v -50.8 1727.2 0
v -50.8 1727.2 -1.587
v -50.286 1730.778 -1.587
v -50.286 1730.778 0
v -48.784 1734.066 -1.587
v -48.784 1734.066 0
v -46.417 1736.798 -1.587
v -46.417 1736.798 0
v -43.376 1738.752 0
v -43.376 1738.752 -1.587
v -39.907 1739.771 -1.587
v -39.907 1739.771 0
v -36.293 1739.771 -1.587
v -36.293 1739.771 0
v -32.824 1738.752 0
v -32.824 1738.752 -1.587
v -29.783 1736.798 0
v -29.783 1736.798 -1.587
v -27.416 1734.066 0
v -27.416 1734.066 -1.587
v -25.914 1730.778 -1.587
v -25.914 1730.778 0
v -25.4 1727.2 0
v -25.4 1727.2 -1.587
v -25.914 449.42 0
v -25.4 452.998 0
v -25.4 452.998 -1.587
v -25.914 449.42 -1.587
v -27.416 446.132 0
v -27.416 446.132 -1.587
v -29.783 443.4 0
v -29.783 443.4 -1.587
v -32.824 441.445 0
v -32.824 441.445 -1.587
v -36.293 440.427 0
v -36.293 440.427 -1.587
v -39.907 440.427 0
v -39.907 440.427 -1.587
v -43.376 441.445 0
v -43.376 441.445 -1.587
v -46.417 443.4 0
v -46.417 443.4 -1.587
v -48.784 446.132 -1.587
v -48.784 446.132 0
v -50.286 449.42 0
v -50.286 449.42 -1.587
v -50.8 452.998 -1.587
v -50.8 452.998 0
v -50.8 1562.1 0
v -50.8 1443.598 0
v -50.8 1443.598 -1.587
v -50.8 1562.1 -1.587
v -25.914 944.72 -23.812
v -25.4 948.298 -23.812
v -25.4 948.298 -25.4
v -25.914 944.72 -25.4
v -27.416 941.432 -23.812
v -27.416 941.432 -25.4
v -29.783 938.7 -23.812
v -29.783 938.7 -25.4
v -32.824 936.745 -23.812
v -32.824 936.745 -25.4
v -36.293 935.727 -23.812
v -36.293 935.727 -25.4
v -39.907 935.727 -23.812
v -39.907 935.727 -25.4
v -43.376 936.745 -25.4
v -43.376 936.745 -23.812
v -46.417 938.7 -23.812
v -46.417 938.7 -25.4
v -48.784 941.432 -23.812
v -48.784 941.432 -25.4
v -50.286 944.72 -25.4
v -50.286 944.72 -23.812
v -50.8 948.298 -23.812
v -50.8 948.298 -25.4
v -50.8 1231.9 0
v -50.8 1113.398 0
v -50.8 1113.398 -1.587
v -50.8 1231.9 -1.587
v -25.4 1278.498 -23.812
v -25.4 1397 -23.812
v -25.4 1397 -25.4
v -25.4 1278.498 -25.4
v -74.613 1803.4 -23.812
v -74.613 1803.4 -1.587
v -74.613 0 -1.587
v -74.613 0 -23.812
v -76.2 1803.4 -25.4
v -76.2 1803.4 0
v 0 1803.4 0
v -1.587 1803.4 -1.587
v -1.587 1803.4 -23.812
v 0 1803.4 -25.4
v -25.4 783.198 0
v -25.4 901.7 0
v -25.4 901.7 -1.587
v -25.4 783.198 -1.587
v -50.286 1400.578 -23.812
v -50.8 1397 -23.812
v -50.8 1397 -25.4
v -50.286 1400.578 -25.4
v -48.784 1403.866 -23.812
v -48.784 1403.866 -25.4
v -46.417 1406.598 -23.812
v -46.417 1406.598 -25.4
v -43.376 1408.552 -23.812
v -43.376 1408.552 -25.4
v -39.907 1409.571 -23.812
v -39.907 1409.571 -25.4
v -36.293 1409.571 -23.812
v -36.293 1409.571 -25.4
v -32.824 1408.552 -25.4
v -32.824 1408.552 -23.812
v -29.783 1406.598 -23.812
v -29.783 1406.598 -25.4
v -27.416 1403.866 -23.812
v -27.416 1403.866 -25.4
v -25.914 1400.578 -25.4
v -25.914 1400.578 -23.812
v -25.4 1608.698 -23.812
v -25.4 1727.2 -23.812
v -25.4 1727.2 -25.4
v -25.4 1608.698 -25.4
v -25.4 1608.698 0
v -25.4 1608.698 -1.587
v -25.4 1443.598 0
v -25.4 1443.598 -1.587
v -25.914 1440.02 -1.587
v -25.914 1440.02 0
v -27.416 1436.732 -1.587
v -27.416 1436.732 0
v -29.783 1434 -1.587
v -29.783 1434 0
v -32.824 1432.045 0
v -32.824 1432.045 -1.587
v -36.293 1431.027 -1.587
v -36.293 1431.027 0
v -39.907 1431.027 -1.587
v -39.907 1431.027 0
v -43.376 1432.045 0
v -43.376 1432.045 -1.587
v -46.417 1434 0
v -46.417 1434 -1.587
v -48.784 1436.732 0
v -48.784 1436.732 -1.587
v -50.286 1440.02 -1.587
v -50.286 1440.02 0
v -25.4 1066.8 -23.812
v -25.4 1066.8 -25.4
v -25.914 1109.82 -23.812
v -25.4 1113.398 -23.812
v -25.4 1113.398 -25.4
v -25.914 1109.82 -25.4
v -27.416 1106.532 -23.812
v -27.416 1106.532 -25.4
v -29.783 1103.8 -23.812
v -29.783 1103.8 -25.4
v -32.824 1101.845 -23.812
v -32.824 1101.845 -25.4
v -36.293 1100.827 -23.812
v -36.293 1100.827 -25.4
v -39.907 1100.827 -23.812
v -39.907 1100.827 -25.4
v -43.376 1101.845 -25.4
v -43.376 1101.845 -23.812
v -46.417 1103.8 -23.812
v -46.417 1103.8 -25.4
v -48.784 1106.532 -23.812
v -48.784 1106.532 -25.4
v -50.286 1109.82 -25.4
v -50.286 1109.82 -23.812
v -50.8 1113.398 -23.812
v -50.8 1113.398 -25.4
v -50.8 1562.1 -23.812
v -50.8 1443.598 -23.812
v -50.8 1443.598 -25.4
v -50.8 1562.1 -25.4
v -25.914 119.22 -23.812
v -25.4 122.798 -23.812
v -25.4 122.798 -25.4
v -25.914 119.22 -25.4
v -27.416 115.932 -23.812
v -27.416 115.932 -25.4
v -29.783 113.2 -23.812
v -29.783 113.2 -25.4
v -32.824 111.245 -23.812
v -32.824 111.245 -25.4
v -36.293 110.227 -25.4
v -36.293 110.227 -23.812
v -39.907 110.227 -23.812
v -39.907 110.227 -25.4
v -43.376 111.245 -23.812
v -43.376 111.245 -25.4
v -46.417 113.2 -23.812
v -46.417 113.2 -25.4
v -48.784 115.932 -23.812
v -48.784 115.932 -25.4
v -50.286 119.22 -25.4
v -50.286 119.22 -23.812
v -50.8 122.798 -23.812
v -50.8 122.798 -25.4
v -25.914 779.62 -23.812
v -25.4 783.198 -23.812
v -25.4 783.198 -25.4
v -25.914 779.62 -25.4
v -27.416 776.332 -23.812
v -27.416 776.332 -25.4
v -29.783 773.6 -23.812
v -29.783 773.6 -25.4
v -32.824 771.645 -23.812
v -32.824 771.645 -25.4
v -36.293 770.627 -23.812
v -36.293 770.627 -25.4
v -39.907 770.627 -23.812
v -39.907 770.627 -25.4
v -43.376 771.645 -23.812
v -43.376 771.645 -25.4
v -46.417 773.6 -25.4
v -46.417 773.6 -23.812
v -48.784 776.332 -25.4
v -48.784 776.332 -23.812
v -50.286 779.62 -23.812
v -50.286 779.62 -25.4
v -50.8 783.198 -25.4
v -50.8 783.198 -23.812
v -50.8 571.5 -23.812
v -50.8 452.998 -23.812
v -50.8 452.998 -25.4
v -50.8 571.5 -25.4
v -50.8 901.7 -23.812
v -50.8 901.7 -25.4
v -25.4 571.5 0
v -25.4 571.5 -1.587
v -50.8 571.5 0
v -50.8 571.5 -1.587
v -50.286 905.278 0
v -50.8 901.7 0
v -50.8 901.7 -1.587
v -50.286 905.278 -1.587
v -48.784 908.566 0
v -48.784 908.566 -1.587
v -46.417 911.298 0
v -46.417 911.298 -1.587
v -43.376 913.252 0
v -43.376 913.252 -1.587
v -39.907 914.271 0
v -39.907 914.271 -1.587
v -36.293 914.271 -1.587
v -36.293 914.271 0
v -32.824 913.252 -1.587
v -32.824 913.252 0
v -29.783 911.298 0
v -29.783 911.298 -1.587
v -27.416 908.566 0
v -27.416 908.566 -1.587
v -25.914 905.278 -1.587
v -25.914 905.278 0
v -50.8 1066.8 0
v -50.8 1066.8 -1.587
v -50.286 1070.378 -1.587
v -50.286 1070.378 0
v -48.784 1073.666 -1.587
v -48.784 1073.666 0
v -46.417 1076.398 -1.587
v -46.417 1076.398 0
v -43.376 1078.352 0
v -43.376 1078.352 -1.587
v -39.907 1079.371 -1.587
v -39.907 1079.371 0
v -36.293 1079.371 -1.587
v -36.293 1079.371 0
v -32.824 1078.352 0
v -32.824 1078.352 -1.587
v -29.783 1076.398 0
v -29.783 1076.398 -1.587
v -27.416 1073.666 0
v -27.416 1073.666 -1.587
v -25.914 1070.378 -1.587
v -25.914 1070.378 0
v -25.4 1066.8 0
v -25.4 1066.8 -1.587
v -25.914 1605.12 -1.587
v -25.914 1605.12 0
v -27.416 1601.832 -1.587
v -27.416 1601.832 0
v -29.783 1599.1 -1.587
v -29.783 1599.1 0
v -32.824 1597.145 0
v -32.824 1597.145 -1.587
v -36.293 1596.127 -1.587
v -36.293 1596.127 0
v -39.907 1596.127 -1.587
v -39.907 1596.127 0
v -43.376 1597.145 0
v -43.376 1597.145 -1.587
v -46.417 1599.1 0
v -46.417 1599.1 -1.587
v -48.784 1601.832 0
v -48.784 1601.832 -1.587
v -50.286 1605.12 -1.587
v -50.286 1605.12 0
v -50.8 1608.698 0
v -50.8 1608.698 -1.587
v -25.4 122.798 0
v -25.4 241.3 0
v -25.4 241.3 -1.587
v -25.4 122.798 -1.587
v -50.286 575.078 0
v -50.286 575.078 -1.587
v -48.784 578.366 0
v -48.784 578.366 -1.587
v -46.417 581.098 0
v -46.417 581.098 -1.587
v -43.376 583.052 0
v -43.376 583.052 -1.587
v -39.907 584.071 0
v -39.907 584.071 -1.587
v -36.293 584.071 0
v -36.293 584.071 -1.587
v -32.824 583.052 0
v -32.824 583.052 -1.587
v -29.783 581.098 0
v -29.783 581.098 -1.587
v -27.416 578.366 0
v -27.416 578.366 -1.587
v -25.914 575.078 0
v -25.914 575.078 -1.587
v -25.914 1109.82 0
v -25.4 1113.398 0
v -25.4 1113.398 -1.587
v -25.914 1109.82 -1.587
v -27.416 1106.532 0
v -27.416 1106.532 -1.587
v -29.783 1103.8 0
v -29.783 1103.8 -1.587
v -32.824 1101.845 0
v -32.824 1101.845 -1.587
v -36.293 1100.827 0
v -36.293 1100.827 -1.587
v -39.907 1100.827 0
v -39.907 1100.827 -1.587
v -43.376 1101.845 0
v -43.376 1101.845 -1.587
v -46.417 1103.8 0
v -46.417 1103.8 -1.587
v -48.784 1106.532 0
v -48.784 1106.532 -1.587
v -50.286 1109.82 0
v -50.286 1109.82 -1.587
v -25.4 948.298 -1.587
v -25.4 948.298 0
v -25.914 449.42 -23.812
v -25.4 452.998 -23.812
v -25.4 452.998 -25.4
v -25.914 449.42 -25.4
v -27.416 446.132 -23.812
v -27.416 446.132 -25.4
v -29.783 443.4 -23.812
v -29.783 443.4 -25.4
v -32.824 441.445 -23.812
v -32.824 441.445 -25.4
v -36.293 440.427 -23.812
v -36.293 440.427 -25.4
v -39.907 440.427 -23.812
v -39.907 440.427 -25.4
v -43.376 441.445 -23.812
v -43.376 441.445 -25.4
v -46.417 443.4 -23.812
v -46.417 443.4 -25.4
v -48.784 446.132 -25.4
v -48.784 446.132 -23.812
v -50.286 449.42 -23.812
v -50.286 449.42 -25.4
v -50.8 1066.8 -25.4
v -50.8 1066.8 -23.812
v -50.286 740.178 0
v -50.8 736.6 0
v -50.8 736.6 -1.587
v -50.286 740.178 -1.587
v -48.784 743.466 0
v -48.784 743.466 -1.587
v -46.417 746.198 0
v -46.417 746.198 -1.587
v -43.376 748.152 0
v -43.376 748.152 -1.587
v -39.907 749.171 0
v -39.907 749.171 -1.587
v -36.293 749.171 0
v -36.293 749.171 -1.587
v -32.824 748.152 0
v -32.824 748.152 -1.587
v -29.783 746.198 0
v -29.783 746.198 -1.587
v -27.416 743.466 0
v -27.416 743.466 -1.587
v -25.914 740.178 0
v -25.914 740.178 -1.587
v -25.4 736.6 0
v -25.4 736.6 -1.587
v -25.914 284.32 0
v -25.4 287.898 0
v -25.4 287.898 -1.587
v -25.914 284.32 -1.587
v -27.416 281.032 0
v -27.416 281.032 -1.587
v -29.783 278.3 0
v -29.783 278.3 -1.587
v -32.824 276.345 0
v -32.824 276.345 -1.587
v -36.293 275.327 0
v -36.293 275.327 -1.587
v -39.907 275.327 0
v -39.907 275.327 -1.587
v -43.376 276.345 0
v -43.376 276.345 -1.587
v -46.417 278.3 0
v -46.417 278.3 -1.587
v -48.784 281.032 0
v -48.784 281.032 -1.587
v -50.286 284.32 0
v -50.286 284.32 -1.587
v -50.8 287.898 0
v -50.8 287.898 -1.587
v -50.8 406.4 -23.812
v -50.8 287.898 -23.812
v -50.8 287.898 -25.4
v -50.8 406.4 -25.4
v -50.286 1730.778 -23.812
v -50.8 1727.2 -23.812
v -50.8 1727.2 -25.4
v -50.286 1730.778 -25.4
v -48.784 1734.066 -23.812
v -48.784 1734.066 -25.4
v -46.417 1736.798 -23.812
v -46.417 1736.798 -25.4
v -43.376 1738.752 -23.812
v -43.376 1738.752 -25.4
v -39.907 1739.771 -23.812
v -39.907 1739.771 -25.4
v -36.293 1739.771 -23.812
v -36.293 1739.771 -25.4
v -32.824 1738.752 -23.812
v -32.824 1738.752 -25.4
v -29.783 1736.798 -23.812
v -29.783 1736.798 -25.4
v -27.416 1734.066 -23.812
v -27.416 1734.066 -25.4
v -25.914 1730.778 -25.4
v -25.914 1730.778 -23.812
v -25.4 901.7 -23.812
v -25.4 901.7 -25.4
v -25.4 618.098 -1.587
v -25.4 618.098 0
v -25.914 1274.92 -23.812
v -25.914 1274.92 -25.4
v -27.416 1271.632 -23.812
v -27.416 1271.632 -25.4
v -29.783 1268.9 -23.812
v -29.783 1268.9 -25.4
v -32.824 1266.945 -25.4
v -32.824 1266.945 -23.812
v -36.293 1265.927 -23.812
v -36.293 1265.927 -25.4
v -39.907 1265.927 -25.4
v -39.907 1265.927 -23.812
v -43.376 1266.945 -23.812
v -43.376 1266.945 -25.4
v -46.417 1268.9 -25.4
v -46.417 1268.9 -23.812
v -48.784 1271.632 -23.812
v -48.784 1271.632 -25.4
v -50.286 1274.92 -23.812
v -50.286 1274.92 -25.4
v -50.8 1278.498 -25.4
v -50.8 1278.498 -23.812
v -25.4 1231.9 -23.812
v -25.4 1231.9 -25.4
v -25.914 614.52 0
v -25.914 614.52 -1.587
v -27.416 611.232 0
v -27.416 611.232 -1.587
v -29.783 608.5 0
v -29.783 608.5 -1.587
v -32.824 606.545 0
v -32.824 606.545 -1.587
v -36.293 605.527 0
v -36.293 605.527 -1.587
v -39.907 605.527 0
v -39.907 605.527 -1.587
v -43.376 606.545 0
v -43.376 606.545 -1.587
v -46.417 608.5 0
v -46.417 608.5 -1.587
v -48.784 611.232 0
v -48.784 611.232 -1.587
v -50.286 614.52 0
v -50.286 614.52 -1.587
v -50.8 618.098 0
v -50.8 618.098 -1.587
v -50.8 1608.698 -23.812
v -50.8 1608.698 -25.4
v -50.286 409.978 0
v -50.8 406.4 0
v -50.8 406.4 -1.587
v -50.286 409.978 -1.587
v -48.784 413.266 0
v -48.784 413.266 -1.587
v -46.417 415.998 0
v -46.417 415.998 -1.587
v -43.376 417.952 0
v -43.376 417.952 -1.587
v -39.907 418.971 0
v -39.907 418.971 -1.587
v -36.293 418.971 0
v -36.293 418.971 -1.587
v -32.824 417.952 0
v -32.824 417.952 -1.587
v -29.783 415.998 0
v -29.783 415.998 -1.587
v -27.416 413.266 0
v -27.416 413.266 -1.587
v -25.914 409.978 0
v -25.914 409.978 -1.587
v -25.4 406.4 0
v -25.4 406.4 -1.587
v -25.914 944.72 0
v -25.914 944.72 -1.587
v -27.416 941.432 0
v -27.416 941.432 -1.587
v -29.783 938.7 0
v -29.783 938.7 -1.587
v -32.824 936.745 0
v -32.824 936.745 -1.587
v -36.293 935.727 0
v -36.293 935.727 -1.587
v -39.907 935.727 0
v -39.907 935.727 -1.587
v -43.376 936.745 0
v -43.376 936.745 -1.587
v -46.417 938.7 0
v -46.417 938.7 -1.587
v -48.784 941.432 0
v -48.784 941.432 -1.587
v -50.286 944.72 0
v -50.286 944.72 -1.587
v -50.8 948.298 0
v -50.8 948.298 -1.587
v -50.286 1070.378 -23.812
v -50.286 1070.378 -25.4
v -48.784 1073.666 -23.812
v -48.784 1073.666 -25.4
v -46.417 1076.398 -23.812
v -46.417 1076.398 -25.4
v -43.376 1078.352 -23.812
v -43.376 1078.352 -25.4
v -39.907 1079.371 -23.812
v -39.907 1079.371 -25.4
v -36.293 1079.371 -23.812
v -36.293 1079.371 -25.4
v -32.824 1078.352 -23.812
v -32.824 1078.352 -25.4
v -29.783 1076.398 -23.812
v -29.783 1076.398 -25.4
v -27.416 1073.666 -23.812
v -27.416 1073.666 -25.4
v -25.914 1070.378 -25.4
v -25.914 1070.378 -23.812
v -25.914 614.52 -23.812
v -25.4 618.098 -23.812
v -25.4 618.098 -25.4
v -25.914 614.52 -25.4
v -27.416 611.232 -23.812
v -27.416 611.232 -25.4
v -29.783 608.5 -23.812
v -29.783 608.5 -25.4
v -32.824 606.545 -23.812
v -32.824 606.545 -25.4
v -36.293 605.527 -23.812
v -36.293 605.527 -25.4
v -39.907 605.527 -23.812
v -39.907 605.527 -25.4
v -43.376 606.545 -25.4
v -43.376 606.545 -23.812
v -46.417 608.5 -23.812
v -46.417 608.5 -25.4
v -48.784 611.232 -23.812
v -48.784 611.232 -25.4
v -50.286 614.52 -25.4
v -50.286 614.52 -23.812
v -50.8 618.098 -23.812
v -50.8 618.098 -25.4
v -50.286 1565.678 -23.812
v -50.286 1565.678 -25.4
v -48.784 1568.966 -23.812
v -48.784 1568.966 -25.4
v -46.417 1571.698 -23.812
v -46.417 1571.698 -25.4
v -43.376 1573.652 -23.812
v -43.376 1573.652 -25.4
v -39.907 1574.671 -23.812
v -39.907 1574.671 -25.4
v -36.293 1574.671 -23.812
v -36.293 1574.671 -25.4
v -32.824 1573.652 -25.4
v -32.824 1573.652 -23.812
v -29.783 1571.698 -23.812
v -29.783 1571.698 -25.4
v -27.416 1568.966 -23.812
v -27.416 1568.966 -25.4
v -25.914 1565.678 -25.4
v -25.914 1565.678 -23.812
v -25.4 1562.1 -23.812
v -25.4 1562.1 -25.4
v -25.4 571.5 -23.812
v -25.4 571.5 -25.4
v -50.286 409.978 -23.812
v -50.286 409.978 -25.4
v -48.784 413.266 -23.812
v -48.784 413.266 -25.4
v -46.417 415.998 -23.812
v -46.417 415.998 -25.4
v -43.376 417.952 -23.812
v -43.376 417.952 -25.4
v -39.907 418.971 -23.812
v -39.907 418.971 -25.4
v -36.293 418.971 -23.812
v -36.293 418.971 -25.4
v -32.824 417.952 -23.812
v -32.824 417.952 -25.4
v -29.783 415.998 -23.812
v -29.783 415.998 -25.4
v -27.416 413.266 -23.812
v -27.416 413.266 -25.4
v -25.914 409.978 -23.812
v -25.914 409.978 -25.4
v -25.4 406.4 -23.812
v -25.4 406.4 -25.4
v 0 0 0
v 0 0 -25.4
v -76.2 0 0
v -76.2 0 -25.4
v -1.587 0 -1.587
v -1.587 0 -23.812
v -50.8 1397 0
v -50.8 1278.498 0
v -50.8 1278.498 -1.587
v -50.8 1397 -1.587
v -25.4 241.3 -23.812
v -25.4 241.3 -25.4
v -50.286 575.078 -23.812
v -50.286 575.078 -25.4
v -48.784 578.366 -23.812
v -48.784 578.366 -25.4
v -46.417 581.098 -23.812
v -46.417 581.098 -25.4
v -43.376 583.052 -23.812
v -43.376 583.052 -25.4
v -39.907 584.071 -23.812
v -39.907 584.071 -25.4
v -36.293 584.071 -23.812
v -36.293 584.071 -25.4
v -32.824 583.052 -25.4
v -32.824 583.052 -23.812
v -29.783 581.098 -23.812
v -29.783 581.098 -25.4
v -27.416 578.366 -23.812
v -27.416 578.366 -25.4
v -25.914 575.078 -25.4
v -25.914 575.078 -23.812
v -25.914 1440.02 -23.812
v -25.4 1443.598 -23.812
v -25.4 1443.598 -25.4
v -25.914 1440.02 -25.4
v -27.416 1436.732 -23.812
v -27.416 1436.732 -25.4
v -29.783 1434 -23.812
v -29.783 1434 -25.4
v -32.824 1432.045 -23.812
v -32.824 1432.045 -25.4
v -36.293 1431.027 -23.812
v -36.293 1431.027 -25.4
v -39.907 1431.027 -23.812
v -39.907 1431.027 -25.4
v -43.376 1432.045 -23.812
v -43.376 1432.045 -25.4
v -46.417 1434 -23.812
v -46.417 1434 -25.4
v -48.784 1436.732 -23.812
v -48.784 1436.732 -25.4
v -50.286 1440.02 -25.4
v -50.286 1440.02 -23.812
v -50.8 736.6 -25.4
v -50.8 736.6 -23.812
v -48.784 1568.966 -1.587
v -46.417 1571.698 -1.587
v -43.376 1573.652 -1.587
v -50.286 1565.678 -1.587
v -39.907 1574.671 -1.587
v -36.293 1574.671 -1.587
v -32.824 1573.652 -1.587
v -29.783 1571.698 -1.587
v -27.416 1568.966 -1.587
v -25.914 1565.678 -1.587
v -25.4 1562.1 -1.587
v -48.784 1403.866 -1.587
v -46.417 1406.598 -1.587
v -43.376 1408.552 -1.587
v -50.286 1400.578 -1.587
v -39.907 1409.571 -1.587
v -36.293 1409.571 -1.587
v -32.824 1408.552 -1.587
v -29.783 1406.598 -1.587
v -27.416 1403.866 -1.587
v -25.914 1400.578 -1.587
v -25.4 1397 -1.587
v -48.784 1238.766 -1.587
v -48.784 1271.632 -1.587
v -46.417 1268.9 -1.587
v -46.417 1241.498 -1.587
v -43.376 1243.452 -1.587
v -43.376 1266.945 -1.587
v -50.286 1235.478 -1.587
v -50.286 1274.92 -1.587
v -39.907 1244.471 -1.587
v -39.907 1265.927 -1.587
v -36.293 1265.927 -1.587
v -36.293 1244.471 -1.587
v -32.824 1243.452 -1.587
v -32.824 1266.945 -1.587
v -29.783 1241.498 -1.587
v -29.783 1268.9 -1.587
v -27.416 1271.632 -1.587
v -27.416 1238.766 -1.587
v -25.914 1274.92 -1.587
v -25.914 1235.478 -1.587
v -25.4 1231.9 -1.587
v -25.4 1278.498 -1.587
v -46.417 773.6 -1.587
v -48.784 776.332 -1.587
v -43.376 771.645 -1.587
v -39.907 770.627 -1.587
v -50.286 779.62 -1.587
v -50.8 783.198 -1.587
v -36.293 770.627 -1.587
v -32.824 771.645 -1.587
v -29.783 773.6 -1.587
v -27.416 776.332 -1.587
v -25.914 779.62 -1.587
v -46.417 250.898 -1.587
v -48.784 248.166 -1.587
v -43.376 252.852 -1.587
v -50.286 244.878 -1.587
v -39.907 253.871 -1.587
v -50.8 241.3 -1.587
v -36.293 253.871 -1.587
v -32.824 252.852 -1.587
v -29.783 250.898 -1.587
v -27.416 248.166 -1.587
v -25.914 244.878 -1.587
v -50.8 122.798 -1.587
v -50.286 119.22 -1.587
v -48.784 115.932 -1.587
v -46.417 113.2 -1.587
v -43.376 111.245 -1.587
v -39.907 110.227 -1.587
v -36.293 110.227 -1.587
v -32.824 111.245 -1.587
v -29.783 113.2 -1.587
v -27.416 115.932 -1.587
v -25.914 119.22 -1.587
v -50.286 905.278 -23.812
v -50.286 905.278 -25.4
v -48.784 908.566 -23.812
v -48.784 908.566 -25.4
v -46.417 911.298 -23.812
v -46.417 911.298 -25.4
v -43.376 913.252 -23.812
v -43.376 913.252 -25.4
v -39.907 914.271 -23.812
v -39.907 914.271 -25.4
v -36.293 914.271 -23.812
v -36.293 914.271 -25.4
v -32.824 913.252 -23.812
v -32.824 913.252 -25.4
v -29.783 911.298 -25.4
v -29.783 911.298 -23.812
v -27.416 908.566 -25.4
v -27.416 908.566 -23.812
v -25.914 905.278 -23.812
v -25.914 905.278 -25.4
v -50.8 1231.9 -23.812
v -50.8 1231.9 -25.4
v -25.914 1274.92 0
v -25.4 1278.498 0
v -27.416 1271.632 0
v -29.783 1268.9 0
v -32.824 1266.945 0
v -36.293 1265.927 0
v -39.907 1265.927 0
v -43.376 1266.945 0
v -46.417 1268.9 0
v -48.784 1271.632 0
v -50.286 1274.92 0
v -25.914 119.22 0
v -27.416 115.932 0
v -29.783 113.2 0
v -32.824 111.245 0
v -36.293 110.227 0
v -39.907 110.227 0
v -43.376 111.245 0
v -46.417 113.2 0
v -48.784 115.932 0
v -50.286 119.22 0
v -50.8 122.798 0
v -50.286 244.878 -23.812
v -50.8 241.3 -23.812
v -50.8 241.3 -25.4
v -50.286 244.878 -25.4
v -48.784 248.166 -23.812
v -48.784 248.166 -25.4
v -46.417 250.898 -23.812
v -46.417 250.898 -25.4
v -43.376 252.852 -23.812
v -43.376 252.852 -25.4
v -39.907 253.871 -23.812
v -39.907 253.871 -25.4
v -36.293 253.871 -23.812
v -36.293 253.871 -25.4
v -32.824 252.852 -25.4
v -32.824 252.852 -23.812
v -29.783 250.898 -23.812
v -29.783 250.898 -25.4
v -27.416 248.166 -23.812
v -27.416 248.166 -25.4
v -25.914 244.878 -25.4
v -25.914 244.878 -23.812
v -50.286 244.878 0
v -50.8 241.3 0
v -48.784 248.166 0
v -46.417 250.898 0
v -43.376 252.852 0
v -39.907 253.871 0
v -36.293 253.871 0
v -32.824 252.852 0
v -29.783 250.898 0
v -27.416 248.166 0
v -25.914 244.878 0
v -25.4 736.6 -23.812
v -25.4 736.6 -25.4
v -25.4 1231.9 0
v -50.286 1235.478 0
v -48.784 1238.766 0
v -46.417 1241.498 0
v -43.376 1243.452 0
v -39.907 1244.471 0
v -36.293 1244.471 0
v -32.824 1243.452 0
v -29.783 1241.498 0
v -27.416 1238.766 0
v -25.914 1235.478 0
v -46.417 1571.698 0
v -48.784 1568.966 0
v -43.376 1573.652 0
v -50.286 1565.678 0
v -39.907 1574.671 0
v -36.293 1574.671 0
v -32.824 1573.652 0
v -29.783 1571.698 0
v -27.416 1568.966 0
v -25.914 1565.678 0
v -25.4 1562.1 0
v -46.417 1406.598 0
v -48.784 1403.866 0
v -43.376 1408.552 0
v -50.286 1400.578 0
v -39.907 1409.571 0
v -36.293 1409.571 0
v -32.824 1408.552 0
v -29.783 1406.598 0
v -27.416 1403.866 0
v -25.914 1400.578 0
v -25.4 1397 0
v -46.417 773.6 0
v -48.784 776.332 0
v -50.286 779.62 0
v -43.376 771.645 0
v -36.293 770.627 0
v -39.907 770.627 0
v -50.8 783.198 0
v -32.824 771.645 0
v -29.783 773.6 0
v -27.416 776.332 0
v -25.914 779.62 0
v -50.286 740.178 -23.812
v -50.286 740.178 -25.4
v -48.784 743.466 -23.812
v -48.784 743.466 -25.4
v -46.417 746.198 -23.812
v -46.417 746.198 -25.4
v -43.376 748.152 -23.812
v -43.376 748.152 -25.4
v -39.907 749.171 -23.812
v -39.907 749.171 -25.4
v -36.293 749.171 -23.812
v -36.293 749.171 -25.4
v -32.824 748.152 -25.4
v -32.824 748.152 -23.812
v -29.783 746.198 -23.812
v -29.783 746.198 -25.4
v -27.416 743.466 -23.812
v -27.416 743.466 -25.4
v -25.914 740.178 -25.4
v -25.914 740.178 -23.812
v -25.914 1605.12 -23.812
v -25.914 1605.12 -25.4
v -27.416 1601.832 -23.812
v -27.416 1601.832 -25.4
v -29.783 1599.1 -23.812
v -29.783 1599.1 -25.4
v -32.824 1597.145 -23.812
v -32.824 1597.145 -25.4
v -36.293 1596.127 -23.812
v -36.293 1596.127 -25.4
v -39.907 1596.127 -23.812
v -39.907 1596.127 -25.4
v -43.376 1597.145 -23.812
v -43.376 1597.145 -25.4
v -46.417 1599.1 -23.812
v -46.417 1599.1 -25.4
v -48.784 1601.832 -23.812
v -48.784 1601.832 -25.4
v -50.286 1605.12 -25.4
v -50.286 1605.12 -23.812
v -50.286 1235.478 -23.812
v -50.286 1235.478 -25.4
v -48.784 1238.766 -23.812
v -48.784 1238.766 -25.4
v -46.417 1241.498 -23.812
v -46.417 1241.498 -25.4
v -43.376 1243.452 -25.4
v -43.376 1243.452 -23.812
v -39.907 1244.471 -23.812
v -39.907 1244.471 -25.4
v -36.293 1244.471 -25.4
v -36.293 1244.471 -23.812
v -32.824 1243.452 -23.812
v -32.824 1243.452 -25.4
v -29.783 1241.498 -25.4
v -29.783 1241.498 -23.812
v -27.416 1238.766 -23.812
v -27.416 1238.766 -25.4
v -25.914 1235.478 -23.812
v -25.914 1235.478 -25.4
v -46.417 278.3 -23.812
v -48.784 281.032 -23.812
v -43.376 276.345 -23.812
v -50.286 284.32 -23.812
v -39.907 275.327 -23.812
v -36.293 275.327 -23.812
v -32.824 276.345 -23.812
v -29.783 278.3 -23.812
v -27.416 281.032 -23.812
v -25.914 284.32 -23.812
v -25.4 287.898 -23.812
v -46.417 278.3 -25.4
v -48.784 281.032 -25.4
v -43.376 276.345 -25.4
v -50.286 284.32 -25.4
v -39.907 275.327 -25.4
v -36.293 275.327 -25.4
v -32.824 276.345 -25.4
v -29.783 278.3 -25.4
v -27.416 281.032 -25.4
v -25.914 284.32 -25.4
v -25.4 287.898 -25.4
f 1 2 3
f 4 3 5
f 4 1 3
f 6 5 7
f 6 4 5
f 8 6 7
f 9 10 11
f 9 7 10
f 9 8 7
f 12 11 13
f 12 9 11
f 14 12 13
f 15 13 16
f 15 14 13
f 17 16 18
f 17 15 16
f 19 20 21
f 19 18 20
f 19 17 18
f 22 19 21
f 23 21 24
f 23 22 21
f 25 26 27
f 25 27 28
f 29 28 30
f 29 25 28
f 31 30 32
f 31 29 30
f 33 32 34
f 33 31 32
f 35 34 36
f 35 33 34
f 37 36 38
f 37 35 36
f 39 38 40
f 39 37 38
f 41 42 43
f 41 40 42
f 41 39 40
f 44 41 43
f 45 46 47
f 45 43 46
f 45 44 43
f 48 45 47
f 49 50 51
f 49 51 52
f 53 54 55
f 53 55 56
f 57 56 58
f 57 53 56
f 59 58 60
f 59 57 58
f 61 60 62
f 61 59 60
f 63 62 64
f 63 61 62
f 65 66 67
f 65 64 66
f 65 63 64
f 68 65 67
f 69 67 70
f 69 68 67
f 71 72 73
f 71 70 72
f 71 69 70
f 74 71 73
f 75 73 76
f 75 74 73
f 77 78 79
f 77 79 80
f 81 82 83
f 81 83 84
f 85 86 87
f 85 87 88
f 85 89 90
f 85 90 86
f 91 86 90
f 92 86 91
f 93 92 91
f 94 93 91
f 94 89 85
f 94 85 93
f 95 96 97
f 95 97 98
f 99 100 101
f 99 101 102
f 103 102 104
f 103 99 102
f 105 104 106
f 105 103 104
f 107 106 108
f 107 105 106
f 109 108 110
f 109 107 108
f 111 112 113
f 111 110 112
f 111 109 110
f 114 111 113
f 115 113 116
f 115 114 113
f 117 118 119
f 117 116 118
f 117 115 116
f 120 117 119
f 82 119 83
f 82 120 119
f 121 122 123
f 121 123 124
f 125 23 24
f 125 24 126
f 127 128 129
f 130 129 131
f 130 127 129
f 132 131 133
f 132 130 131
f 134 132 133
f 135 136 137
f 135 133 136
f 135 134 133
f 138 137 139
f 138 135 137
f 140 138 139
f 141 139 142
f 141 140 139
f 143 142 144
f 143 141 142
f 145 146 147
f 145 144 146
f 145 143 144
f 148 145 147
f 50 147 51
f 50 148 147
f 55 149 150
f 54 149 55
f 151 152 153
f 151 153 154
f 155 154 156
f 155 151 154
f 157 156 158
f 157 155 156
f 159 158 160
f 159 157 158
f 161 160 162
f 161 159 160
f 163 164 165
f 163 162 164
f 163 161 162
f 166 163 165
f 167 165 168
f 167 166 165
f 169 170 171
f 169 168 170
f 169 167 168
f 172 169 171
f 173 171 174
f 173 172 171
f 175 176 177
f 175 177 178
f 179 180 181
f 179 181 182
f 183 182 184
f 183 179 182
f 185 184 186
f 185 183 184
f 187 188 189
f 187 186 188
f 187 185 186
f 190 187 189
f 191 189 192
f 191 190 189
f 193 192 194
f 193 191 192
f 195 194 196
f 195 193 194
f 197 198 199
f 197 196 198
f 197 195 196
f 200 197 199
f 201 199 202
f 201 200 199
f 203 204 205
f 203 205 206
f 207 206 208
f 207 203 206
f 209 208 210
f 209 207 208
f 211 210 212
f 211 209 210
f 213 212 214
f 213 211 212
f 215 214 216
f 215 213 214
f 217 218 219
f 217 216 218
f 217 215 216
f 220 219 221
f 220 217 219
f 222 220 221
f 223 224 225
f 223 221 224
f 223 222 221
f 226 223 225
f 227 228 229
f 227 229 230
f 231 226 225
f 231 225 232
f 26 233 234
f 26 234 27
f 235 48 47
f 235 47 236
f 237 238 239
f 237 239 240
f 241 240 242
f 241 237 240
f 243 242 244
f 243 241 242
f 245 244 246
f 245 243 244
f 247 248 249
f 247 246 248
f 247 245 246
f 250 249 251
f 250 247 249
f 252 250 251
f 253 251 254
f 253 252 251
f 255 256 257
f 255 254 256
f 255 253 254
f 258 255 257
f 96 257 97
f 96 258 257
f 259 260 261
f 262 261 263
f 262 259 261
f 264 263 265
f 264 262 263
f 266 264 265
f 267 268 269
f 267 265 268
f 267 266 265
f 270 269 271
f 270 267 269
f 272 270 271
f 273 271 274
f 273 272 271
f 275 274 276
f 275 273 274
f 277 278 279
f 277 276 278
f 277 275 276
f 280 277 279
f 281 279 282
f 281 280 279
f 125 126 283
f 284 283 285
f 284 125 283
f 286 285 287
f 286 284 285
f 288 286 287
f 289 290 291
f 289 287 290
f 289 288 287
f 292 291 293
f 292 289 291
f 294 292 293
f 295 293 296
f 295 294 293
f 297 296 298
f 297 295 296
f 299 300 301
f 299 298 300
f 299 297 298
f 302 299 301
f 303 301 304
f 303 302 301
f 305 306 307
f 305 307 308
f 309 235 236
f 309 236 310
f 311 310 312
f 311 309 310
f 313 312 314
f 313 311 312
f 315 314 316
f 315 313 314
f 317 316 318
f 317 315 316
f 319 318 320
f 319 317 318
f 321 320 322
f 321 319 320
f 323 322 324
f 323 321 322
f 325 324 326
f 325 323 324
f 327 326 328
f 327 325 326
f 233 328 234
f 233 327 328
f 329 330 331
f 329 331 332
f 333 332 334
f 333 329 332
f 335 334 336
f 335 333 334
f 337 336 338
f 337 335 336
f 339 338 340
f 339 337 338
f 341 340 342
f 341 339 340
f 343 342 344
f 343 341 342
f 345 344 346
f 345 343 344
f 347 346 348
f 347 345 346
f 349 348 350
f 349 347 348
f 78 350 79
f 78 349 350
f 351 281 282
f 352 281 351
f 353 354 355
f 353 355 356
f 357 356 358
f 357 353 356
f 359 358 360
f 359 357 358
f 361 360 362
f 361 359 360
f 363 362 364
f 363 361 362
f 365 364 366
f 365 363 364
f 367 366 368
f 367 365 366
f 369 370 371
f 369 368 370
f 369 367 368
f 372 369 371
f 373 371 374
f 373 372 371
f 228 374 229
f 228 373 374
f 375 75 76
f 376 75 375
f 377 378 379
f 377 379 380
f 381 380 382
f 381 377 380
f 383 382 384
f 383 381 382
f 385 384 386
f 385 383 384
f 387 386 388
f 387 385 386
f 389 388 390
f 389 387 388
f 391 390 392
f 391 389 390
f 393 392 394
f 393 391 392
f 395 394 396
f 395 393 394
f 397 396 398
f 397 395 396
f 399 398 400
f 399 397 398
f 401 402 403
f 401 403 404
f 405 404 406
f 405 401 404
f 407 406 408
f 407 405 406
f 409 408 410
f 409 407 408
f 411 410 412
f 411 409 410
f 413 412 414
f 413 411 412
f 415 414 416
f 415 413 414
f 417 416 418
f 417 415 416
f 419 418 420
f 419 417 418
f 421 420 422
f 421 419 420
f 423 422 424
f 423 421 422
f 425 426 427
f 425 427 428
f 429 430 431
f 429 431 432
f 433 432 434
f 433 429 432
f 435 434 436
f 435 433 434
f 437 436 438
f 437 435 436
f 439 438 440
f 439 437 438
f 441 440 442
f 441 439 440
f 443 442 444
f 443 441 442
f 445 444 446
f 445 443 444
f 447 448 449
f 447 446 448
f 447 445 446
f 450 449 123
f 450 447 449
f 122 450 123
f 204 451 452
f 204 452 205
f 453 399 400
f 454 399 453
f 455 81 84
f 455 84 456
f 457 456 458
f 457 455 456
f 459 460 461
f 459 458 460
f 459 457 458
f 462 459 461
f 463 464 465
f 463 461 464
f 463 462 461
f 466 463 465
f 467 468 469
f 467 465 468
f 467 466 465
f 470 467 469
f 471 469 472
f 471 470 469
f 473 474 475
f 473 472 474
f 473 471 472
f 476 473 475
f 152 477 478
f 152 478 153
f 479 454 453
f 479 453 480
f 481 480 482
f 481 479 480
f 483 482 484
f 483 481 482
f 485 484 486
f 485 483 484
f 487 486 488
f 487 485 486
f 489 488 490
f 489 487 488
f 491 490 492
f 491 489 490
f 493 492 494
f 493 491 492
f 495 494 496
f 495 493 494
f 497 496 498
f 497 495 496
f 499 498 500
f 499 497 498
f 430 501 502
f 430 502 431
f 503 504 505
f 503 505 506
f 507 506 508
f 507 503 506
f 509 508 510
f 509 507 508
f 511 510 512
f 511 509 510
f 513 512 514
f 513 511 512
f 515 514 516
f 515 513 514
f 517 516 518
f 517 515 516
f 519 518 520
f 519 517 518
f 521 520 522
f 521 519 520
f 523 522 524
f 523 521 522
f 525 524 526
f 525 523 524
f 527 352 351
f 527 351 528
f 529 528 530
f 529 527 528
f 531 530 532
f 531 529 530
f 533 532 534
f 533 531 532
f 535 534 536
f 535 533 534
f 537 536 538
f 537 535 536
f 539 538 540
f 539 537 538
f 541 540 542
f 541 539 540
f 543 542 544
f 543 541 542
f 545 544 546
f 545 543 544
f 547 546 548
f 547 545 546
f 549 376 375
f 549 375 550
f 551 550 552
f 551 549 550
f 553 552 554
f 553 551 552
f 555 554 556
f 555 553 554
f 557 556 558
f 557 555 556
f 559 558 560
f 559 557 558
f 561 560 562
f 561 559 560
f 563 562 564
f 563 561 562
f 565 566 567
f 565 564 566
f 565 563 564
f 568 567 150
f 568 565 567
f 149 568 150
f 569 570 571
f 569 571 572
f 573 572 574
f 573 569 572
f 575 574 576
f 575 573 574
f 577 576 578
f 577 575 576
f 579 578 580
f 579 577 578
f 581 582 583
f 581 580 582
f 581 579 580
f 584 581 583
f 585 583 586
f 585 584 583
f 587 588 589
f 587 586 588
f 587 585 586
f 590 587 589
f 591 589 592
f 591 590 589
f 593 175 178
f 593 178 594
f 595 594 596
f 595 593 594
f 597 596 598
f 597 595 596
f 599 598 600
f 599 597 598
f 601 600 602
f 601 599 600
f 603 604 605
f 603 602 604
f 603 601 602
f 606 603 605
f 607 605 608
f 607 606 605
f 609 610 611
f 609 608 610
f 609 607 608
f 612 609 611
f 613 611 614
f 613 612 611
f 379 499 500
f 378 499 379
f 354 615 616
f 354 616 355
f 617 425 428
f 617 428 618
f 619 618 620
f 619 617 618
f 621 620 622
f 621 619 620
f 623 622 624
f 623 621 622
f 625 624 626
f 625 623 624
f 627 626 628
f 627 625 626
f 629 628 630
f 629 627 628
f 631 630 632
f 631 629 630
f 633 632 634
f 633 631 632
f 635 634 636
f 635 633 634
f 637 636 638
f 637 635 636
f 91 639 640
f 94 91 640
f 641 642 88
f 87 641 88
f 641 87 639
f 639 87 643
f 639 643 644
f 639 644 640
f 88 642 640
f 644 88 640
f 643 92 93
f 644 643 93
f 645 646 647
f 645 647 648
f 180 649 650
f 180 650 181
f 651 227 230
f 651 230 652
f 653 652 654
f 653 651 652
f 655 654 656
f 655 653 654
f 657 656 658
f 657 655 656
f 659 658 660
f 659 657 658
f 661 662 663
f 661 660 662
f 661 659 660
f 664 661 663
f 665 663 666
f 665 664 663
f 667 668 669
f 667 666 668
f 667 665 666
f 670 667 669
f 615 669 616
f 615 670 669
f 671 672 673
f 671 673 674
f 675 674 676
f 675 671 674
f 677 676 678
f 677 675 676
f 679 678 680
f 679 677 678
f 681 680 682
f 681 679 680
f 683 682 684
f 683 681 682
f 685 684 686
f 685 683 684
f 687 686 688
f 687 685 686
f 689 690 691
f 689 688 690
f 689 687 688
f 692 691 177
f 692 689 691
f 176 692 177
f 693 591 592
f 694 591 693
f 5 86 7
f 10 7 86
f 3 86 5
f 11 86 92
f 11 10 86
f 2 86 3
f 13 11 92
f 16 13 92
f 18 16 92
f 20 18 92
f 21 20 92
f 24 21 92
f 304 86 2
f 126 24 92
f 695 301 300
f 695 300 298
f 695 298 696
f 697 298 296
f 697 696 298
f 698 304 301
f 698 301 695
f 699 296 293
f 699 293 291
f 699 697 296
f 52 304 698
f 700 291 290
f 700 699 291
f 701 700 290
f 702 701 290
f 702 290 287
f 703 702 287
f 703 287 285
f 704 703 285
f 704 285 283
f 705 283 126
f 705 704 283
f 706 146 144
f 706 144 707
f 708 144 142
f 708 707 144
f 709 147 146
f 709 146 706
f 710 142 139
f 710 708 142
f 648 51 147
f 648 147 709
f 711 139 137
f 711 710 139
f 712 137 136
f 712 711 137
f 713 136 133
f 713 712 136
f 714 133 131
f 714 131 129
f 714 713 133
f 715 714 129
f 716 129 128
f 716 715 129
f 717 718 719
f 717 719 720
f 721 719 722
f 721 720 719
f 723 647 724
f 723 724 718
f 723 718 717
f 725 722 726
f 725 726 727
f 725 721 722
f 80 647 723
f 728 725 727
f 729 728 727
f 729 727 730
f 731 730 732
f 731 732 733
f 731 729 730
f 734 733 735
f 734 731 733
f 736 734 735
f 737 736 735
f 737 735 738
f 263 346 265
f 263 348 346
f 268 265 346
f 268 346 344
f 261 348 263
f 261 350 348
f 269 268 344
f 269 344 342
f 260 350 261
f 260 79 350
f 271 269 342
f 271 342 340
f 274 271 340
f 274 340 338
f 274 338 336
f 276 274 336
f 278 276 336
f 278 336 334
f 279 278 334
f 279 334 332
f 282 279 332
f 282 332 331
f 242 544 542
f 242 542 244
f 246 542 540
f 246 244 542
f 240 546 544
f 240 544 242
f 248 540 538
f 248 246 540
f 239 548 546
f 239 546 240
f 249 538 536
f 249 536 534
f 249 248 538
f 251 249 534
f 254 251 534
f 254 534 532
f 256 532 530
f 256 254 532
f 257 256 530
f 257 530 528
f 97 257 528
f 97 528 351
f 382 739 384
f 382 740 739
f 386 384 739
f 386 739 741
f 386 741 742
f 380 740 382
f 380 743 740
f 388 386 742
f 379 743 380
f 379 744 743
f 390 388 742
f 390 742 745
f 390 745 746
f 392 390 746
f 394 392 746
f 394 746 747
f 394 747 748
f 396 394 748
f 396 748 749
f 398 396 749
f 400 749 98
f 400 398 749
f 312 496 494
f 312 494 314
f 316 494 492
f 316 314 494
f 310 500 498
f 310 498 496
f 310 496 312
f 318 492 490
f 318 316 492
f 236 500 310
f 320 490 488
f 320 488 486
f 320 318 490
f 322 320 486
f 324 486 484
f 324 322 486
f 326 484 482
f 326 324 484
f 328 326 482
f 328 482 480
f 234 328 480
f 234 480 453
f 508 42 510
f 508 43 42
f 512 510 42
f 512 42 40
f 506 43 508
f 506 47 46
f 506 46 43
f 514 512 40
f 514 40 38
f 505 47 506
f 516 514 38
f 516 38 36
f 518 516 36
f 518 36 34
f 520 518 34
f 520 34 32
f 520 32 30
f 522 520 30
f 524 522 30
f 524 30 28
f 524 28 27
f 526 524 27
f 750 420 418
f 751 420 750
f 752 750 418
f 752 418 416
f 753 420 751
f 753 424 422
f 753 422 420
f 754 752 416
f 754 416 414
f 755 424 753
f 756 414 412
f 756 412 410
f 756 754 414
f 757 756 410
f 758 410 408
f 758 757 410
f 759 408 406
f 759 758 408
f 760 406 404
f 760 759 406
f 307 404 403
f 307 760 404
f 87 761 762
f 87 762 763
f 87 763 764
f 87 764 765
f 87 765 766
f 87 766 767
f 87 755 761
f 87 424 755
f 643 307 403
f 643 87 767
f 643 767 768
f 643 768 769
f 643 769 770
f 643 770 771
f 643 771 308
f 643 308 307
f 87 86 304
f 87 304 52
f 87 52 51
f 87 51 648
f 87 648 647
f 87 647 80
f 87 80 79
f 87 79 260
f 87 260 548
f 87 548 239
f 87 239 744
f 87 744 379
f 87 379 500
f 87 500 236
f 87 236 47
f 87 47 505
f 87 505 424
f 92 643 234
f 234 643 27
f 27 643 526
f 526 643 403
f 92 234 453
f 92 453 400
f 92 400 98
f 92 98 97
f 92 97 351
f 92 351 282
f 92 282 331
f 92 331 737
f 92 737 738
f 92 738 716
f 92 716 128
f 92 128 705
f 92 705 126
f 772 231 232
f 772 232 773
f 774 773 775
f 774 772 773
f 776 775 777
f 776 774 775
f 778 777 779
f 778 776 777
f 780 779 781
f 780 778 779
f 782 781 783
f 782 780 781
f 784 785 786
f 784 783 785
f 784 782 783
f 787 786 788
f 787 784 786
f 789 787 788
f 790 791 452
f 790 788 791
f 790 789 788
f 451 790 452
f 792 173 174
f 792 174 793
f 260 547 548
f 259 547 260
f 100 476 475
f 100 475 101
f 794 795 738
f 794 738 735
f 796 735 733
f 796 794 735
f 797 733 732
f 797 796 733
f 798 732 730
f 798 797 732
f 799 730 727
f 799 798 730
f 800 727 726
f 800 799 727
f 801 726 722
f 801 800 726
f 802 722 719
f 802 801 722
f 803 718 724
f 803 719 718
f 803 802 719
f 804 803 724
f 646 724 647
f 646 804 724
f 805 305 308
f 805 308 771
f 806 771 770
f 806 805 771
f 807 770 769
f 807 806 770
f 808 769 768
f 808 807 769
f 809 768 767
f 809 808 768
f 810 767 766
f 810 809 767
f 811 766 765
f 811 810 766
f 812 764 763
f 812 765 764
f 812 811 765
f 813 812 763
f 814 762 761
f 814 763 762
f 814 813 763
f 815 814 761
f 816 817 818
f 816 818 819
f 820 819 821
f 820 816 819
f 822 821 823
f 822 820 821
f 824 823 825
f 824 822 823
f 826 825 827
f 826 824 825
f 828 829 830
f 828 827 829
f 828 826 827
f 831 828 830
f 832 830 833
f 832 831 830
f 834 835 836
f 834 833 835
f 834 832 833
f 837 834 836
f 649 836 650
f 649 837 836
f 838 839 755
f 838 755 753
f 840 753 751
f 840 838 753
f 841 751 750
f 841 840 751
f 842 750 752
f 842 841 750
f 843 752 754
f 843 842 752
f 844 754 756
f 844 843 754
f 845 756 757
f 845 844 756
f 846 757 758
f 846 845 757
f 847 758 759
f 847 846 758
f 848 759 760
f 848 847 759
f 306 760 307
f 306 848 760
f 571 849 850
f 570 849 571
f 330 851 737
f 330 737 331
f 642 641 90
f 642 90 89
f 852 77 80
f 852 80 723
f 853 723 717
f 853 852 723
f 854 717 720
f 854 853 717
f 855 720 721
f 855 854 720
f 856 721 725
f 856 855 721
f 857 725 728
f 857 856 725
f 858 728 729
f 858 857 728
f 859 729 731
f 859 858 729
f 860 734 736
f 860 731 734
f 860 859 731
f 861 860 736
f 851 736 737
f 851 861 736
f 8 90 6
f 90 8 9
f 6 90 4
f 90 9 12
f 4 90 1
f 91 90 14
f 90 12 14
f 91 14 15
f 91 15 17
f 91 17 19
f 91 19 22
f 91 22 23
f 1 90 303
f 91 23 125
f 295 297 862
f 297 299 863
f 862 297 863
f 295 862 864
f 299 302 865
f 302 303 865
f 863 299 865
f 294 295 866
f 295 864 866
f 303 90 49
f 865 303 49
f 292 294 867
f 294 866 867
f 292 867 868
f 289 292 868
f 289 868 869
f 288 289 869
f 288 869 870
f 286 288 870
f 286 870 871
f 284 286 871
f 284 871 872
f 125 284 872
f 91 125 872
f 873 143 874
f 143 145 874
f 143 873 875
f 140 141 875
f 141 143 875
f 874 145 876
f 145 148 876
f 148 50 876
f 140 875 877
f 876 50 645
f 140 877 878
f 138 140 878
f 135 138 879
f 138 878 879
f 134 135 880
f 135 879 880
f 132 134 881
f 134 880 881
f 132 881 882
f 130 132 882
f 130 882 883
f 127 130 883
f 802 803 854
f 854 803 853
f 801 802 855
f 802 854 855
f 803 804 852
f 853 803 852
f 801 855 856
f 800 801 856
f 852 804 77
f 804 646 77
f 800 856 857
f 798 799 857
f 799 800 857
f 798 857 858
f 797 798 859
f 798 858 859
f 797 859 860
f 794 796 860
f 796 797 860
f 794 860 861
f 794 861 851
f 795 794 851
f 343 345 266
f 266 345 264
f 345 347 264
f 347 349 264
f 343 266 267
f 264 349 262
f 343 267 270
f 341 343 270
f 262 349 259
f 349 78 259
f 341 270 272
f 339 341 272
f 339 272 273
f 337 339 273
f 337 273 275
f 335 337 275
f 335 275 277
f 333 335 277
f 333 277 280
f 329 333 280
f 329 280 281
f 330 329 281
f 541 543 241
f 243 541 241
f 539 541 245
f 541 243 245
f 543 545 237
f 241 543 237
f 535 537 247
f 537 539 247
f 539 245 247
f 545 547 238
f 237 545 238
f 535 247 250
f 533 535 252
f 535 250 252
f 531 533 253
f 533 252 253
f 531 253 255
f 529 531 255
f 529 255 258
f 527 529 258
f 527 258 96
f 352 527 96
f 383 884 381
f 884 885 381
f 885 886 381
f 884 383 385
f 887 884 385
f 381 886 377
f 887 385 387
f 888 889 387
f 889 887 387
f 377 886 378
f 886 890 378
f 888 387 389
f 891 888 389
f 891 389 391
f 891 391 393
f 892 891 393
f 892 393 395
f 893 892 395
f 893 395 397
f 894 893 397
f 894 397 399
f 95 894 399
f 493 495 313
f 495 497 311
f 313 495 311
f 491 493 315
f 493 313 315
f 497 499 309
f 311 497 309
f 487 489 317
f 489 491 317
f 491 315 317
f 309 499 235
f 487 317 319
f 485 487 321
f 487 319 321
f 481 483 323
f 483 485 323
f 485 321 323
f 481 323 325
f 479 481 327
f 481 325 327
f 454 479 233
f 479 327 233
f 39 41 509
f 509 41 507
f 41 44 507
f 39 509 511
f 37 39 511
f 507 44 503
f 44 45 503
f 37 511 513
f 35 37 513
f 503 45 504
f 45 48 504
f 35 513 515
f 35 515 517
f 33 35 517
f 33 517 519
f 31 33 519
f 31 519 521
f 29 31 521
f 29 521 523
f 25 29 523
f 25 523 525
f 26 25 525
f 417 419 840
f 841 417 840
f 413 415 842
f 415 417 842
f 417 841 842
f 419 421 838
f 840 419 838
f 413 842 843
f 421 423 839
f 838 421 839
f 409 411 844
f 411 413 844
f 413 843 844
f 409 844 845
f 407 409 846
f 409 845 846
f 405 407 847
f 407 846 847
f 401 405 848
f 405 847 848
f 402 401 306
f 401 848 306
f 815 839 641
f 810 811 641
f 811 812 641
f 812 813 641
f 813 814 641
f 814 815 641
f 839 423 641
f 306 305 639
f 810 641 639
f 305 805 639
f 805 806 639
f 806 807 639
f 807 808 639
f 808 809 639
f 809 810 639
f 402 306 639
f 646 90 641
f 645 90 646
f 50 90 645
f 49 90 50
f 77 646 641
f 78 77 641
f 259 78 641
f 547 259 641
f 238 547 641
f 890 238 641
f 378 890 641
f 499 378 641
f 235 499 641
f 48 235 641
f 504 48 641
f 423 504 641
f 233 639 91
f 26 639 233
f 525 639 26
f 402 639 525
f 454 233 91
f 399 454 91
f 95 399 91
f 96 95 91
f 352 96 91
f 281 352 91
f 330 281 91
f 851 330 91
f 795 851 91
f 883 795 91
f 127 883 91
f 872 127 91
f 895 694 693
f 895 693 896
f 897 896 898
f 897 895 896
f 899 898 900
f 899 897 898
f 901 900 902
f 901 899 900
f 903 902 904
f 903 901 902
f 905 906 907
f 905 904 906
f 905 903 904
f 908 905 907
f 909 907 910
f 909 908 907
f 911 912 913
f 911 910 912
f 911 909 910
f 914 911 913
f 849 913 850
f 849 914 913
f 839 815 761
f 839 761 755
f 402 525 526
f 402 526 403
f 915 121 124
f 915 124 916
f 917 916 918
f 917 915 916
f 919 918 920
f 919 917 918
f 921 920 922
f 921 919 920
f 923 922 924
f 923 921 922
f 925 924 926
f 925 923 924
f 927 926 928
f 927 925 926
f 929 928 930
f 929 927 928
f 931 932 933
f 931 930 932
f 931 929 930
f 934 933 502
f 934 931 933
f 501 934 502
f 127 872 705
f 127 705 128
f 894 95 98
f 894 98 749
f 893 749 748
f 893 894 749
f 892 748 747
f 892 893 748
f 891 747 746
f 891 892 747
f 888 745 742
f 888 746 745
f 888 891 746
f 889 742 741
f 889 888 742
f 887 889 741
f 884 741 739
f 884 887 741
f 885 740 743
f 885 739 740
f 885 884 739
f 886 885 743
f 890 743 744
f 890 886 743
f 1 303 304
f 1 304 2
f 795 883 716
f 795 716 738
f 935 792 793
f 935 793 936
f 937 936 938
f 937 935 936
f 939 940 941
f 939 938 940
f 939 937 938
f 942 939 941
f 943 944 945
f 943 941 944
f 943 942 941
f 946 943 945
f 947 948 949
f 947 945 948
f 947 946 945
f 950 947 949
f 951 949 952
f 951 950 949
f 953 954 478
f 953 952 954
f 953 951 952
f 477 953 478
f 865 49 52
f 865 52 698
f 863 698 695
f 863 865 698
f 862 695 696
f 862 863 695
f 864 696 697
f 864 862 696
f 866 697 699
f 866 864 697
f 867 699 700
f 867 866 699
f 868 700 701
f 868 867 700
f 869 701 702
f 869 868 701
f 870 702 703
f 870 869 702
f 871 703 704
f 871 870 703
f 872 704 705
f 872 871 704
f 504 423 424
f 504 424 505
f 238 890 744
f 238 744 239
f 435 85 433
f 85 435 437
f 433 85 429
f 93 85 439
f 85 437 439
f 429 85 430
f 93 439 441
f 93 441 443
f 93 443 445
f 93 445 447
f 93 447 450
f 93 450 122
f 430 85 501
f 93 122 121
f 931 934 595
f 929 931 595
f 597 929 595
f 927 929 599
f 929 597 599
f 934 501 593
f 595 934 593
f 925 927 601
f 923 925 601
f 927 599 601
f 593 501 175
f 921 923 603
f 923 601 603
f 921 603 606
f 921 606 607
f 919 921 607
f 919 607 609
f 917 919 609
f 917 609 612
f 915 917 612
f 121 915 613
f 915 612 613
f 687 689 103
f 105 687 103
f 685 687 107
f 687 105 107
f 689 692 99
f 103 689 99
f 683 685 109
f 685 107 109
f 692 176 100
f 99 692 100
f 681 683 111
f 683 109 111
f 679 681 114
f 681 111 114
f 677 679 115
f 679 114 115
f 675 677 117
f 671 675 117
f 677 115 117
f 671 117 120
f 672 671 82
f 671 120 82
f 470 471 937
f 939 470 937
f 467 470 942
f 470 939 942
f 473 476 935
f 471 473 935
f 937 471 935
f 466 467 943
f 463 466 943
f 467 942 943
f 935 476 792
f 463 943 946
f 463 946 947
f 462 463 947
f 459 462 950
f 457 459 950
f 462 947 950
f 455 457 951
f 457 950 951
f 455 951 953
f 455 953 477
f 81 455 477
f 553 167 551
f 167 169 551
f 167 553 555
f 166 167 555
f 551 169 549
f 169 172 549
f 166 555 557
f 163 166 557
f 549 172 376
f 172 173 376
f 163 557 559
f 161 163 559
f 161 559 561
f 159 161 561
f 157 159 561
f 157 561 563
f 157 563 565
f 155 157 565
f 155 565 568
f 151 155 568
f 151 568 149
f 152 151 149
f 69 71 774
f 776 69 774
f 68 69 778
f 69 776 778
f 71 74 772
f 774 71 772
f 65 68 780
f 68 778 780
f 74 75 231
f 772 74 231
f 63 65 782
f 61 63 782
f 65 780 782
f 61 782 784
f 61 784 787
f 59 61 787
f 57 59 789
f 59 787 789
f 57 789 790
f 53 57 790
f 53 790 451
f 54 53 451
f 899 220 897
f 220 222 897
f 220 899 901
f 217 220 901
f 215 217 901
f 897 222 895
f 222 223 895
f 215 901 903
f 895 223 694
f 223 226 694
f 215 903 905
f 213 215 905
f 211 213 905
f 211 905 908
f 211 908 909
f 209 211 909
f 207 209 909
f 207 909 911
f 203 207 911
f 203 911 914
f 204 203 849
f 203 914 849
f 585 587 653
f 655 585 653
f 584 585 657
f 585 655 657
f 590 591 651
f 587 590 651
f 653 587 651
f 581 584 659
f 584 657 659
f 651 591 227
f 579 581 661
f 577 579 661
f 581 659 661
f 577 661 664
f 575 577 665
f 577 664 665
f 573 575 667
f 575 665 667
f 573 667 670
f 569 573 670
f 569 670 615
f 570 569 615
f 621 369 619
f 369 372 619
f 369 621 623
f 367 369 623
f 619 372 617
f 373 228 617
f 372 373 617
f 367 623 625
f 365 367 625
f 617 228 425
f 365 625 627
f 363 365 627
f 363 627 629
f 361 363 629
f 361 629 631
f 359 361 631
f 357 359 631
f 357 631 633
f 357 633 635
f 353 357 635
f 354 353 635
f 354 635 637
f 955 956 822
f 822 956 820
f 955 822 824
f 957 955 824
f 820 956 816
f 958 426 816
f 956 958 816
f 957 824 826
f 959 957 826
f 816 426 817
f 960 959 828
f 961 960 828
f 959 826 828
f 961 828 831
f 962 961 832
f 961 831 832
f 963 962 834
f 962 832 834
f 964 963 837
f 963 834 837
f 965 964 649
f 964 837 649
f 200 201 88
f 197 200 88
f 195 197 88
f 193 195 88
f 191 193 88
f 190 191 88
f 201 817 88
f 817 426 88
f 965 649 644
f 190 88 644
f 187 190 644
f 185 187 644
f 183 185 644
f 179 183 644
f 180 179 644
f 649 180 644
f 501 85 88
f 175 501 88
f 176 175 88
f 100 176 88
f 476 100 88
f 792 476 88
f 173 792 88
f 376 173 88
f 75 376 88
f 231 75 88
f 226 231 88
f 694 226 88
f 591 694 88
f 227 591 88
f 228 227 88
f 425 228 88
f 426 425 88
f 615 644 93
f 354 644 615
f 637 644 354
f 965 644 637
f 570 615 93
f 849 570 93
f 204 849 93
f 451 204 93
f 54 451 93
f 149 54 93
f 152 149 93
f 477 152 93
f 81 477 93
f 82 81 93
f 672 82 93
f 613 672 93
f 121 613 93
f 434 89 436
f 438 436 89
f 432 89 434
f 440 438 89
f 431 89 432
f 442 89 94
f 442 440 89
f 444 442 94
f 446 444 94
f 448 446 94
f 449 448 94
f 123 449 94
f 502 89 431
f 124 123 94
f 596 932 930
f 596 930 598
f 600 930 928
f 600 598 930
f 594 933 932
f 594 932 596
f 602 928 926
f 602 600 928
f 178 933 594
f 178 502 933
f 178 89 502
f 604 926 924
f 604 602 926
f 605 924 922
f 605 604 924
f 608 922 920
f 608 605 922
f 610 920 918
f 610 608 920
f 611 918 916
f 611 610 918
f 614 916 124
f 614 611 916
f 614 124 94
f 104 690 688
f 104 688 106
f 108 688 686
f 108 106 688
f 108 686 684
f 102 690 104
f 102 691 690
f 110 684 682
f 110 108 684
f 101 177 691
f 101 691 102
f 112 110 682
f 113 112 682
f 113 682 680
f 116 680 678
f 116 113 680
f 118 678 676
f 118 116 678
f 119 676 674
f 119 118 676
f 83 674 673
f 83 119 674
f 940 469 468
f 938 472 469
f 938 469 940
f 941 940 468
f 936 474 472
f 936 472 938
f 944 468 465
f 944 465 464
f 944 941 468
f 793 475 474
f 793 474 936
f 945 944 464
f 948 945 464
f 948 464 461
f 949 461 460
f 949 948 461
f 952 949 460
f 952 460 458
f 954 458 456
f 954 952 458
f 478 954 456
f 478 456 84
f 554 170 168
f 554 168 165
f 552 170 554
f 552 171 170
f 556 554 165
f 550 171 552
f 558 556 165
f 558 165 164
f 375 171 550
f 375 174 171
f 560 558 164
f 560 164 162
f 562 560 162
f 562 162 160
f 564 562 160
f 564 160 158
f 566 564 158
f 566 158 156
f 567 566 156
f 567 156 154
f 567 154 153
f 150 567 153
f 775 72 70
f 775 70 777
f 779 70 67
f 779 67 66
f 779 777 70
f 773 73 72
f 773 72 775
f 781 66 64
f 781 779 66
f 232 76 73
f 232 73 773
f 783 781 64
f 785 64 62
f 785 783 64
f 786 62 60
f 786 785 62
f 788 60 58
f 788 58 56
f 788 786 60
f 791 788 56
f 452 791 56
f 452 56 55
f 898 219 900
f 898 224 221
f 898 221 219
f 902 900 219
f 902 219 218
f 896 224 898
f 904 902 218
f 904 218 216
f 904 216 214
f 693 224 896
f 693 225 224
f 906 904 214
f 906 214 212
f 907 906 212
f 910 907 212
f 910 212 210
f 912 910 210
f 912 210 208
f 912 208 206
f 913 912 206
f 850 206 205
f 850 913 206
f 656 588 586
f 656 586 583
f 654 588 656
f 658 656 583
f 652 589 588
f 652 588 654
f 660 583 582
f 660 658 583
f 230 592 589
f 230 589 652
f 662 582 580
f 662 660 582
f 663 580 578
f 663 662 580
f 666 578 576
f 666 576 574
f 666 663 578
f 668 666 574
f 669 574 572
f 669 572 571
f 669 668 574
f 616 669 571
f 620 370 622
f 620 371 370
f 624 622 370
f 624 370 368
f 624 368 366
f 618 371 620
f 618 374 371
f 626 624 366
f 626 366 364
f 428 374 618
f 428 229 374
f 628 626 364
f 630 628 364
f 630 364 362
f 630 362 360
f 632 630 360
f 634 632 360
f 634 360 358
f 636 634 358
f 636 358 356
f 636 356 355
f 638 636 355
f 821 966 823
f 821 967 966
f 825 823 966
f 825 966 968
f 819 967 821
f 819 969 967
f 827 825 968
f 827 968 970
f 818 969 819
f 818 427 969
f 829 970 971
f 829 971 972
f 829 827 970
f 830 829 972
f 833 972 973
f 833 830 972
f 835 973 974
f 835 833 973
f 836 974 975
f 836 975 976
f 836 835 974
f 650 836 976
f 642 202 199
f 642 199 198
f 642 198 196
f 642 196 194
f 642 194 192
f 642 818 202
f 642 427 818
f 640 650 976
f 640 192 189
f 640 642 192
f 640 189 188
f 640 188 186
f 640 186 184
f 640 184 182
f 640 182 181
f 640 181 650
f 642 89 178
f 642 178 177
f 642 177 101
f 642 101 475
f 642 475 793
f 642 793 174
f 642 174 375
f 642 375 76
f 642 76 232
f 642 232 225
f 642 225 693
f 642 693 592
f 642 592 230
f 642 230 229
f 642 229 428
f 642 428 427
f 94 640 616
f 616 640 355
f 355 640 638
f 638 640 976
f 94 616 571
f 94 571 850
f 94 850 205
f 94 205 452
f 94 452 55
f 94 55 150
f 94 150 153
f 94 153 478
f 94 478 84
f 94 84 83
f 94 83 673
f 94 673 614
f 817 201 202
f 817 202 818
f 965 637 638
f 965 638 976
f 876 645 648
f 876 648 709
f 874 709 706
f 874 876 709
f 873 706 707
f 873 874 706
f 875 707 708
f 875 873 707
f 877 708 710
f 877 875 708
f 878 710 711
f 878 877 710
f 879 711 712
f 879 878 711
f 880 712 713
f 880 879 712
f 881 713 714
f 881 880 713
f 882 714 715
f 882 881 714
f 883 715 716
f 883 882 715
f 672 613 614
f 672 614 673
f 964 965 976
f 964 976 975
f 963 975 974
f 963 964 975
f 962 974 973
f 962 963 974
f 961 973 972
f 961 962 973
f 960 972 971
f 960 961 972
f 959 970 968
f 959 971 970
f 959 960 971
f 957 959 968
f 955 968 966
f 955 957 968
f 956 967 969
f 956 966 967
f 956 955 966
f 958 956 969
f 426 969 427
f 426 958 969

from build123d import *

# Parameters (mm, degrees)
SKETCH1_W           = 76.2
SKETCH1_H           = 25.4
SKETCH1_W_2         = 73.025
SKETCH1_H_2         = 22.225
BOSS_EXTRUDE1_DEPTH = 1803.4
CUT_EXTRUDE1_DEPTH  = 1806.187846181


with BuildPart() as part:
    # Sketch1 → Boss-Extrude1 (new body)
    with BuildSketch(Plane(origin=(0, 0, 0), x_dir=(1, 0, 0), z_dir=(0, 1, 0))):
        with Locations((-38.1, 12.7)):
            Rectangle(SKETCH1_W, SKETCH1_H)
        with Locations((-38.1, 12.7)):
            Rectangle(SKETCH1_W_2, SKETCH1_H_2, mode=Mode.SUBTRACT)
    extrude(amount=BOSS_EXTRUDE1_DEPTH)

    # Sketch2 → Cut-Extrude1 (cut, through all)
    with BuildSketch(Plane.XY):
        with BuildLine():
            Line((-25.4, 1727.2), (-25.4, 1608.697688474))
            ThreePointArc((-25.4, 1608.697688474), (-38.1, 1595.997688474), (-50.8, 1608.697688474))
            Line((-50.8, 1608.697688474), (-50.8, 1727.2))
            ThreePointArc((-50.8, 1727.2), (-38.1, 1739.9), (-25.4, 1727.2))
        make_face()
        with BuildLine():
            Line((-25.4, 1562.1), (-25.4, 1443.597688474))
            ThreePointArc((-25.4, 1443.597688474), (-38.1, 1430.897688474), (-50.8, 1443.597688474))
            Line((-50.8, 1443.597688474), (-50.8, 1562.1))
            ThreePointArc((-50.8, 1562.1), (-38.1, 1574.8), (-25.4, 1562.1))
        make_face()
        with BuildLine():
            Line((-25.4, 1397), (-25.4, 1278.497688474))
            ThreePointArc((-25.4, 1278.497688474), (-38.1, 1265.797688474), (-50.8, 1278.497688474))
            Line((-50.8, 1278.497688474), (-50.8, 1397))
            ThreePointArc((-50.8, 1397), (-38.1, 1409.7), (-25.4, 1397))
        make_face()
        with BuildLine():
            Line((-25.4, 1231.9), (-25.4, 1113.397688474))
            ThreePointArc((-25.4, 1113.397688474), (-38.1, 1100.697688474), (-50.8, 1113.397688474))
            Line((-50.8, 1113.397688474), (-50.8, 1231.9))
            ThreePointArc((-50.8, 1231.9), (-38.1, 1244.6), (-25.4, 1231.9))
        make_face()
        with BuildLine():
            Line((-25.4, 1066.8), (-25.4, 948.297688474))
            ThreePointArc((-25.4, 948.297688474), (-38.1, 935.597688474), (-50.8, 948.297688474))
            Line((-50.8, 948.297688474), (-50.8, 1066.8))
            ThreePointArc((-50.8, 1066.8), (-38.1, 1079.5), (-25.4, 1066.8))
        make_face()
        with BuildLine():
            Line((-25.4, 901.7), (-25.4, 783.197688474))
            ThreePointArc((-25.4, 783.197688474), (-38.1, 770.497688474), (-50.8, 783.197688474))
            Line((-50.8, 783.197688474), (-50.8, 901.7))
            ThreePointArc((-50.8, 901.7), (-38.1, 914.4), (-25.4, 901.7))
        make_face()
        with BuildLine():
            Line((-25.4, 736.6), (-25.4, 618.097688474))
            ThreePointArc((-25.4, 618.097688474), (-38.1, 605.397688474), (-50.8, 618.097688474))
            Line((-50.8, 618.097688474), (-50.8, 736.6))
            ThreePointArc((-50.8, 736.6), (-38.1, 749.3), (-25.4, 736.6))
        make_face()
        with BuildLine():
            Line((-25.4, 571.5), (-25.4, 452.997688474))
            ThreePointArc((-25.4, 452.997688474), (-38.1, 440.297688474), (-50.8, 452.997688474))
            Line((-50.8, 452.997688474), (-50.8, 571.5))
            ThreePointArc((-50.8, 571.5), (-38.1, 584.2), (-25.4, 571.5))
        make_face()
        with BuildLine():
            Line((-25.4, 406.4), (-25.4, 287.897688474))
            ThreePointArc((-25.4, 287.897688474), (-38.1, 275.197688474), (-50.8, 287.897688474))
            Line((-50.8, 287.897688474), (-50.8, 406.4))
            ThreePointArc((-50.8, 406.4), (-38.1, 419.1), (-25.4, 406.4))
        make_face()
        with BuildLine():
            Line((-25.4, 241.3), (-25.4, 122.797688474))
            ThreePointArc((-25.4, 122.797688474), (-38.1, 110.097688474), (-50.8, 122.797688474))
            Line((-50.8, 122.797688474), (-50.8, 241.3))
            ThreePointArc((-50.8, 241.3), (-38.1, 254), (-25.4, 241.3))
        make_face()
    extrude(amount=-CUT_EXTRUDE1_DEPTH, mode=Mode.SUBTRACT)


solid = part.part
